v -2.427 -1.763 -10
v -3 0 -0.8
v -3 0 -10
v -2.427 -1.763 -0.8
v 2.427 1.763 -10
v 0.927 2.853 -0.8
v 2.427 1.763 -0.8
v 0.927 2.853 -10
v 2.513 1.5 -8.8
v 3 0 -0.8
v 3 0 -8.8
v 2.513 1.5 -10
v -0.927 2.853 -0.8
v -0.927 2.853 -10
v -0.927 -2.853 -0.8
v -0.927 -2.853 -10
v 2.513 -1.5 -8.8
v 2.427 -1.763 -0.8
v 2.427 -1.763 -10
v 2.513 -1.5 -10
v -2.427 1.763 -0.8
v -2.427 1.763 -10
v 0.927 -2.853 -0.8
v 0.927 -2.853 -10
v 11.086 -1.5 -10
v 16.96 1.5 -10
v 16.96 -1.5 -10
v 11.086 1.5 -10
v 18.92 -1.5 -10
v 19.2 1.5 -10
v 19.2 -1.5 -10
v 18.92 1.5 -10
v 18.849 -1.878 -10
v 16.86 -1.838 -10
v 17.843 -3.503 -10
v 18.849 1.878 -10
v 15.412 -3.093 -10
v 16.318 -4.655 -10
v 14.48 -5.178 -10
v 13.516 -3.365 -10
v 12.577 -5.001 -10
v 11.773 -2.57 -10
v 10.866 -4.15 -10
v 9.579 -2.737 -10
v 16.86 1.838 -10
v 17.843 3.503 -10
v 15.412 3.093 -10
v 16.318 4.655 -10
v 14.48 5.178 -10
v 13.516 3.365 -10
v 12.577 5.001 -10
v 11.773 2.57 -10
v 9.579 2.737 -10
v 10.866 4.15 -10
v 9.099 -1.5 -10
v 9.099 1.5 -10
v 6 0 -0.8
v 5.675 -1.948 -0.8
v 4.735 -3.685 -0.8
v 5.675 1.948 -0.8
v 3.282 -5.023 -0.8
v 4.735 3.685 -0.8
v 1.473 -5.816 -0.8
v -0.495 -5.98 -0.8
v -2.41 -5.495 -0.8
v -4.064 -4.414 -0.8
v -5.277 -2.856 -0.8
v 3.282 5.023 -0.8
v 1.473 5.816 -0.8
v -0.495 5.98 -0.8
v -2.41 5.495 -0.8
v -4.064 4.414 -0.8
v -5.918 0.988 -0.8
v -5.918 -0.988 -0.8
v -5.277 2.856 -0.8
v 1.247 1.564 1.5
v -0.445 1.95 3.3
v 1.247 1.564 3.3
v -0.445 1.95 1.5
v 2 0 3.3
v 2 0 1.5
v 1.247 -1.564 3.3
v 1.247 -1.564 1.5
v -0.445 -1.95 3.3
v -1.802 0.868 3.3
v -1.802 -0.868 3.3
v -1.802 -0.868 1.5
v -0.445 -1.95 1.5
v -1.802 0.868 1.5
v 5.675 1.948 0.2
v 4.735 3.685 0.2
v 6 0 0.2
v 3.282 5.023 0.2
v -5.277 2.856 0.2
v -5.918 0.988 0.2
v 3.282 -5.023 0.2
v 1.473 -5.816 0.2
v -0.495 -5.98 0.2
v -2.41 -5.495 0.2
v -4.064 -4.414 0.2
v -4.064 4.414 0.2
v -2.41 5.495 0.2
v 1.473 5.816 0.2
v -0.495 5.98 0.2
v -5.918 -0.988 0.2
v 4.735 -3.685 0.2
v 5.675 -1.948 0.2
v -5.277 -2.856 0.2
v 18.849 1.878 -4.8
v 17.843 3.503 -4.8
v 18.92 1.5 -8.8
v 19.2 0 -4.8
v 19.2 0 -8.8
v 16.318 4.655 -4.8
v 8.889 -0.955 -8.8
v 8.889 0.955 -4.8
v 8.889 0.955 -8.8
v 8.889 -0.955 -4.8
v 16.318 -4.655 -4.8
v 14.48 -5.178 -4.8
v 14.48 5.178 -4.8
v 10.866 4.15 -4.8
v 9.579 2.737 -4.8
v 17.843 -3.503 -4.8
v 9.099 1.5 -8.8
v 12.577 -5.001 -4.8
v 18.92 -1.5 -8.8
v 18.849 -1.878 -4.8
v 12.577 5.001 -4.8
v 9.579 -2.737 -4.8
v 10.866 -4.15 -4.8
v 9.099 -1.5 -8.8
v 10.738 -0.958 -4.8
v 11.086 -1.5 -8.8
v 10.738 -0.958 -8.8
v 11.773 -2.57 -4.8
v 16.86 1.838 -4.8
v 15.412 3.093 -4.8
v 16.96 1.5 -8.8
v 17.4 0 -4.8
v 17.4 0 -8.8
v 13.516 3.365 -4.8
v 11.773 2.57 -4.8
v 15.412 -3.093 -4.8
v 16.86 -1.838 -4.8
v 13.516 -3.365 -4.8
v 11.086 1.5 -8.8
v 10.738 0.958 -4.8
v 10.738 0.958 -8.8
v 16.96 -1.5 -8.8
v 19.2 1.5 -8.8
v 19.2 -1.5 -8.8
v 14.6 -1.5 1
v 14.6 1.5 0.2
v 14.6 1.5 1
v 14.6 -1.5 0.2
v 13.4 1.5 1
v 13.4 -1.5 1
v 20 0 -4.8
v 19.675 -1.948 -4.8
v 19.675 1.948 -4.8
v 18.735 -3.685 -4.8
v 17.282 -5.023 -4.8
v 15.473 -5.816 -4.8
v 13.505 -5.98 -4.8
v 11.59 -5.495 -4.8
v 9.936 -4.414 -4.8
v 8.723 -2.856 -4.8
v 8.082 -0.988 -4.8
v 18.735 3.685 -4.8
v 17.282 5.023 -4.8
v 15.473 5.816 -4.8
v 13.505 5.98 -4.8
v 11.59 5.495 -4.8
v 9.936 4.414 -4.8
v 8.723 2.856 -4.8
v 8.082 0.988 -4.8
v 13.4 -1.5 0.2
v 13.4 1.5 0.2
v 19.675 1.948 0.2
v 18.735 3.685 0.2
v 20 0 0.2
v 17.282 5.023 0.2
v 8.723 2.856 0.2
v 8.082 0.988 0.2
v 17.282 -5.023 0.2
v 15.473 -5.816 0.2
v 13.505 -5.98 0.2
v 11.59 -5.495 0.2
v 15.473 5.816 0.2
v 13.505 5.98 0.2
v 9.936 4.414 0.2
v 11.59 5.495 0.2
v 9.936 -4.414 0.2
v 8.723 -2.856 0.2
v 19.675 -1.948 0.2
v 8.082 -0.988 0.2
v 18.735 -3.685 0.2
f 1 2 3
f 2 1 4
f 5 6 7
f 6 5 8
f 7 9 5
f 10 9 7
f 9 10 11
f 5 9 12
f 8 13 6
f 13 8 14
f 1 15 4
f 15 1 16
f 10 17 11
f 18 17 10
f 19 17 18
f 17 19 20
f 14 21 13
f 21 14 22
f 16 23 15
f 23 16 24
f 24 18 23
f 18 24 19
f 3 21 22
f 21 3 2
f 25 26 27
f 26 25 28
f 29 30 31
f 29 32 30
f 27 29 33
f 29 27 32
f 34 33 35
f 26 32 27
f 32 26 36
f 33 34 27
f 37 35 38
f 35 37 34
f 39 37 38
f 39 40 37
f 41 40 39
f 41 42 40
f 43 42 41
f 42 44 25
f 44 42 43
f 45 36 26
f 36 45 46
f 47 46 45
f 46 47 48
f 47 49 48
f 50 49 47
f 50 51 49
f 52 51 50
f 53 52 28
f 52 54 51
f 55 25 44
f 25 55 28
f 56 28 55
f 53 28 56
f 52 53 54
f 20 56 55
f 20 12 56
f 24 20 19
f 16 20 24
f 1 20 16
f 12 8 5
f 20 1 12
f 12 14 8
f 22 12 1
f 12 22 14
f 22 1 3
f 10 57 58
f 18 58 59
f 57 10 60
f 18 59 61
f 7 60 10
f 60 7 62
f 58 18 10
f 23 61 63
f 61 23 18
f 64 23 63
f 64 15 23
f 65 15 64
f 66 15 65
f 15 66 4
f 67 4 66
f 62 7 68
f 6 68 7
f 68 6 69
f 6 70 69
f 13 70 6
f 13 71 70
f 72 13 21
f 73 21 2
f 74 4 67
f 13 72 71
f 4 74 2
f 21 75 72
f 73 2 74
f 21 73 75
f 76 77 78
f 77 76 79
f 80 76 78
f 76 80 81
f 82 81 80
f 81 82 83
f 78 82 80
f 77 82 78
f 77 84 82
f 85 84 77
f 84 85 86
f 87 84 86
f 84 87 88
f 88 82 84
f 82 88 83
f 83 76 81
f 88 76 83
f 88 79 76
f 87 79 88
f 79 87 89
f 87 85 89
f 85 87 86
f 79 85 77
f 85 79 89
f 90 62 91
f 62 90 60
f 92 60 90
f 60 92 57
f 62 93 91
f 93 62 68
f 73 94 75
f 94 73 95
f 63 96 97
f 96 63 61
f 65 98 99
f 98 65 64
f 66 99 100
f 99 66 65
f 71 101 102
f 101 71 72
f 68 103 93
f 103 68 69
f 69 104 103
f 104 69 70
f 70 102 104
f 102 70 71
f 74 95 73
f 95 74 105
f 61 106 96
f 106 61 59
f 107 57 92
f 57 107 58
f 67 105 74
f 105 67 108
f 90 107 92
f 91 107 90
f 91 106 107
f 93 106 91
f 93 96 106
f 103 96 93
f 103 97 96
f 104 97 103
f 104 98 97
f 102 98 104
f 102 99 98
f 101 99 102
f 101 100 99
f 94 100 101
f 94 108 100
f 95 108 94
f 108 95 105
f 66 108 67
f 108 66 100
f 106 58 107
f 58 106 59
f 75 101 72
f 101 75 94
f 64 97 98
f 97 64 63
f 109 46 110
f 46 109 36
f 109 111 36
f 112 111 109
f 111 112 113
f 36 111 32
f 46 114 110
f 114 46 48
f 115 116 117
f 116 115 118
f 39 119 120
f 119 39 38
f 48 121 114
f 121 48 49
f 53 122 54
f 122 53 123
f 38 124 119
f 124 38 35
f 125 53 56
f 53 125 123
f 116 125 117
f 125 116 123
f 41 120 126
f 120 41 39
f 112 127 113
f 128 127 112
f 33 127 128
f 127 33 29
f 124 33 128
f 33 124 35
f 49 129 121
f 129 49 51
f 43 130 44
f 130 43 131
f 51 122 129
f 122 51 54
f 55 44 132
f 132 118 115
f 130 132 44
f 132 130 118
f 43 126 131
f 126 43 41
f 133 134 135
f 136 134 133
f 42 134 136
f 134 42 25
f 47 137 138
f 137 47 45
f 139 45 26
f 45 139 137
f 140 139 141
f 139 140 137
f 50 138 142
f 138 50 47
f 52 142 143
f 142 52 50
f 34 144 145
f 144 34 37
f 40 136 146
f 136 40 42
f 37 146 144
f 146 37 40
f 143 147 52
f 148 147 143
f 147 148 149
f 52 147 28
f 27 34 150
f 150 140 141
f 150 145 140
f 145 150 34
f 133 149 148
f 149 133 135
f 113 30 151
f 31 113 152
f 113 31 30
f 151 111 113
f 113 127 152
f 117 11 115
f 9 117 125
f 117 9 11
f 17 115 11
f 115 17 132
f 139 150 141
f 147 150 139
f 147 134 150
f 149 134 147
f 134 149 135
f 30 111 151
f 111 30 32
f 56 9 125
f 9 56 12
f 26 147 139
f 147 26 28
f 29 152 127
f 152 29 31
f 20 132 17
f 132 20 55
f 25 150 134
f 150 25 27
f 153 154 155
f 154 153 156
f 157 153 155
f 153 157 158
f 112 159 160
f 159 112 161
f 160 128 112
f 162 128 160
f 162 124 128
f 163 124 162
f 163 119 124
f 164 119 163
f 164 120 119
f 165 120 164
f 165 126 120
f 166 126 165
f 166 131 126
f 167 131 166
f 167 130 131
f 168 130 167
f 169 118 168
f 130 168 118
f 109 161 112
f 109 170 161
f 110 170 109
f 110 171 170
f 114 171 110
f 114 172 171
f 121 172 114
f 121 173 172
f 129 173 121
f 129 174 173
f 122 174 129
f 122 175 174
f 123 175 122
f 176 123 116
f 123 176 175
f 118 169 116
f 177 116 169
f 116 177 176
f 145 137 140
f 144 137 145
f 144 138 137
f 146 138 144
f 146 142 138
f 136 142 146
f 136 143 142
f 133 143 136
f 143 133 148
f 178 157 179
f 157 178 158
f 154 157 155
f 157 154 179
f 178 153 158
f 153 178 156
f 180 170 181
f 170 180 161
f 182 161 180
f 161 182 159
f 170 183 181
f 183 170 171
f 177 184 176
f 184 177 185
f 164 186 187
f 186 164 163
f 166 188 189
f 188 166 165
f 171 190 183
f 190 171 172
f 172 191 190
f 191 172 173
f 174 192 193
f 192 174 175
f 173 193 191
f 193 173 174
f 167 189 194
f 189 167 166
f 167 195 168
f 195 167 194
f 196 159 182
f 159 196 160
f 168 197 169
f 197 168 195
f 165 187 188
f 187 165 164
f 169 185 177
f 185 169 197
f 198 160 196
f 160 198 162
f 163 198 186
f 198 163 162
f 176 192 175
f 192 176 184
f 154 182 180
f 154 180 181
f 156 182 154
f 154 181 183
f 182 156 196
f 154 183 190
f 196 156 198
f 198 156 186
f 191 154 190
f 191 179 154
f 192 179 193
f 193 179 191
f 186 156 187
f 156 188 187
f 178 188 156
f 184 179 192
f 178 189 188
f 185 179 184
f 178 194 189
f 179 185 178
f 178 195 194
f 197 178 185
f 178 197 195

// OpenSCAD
// Parameters
thread_major_diameter = 6.0; //[3.0:12.0:0.1]
overall_length = 10.0; //[5.0:20.0:0.1]
head_diameter = 10.5; //[6.0:21.0:0.1]
head_height = 3.3; //[1.6:6.6:0.1]
thread_length = 10.0; //[5.0:20.0:0.1]
drive_recess_diameter = 4.0; //[2.0:7.0:0.1]
drive_recess_depth = 1.8; //[0.8:3.0:0.1]
transition_height = 0.8; //[0.4:1.6:0.1]
transition_overlap = 0.8; //[0.5:2.0:0.1]
washer_outer_diameter = 12.0; //[8.0:24.0:0.1]
washer_thickness = 1.0; //[0.5:2.5:0.1]
pcb_spacer_height = 6.0; //[3.0:12.0:0.1]
pcb_spacer_wall = 1.8; //[0.9:3.6:0.1]
pcb_spacer_clearance = 0.4; //[0.2:0.8:0.1]
buzzer_diameter = 12.0; //[8.0:24.0:0.1]
buzzer_height = 5.0; //[3.0:10.0:0.1]
bridge_thickness = 1.2; //[0.6:2.4:0.1]
bridge_width = 3.0; //[1.5:6.0:0.1]
side_offset = 14.0; //[8.0:28.0:0.1]

// Screw and Washer - complete geometry
module screw_and_washer() {
  color("DimGray") {
    // Threaded Shaft
    translate([0, 0, -overall_length/2])
      cylinder(h=overall_length, r=thread_major_diameter/2, center=true);

    // Head Transition
    translate([0, 0, transition_height/2 - transition_overlap])
      cylinder(h=transition_height, r1=head_diameter/2, r2=thread_major_diameter/2, center=true);

    // Dome Head
    intersection() {
      translate([0, 0, head_height - ((head_diameter/2)^2 + head_height^2)/(2*head_height)])
        sphere(r=((head_diameter/2)^2 + head_height^2)/(2*head_height));
      translate([0, 0, head_height + ((head_diameter/2)^2 + head_height^2)/(2*head_height)])
        cube([head_diameter*3, head_diameter*3, ((head_diameter/2)^2 + head_height^2)/(2*head_height)*2], center=true);
    }

    // Drive Recess
    translate([0, 0, head_height - drive_recess_depth/2])
      difference() {
        cylinder(h=drive_recess_depth, r=drive_recess_diameter/2, center=true);
      }

    // Washer
    translate([0, 0, washer_thickness/2 - transition_overlap])
      cylinder(h=washer_thickness, r=washer_outer_diameter/2, center=true);
  }
}

// PCB Spacer - complete geometry
module pcb_spacer() {
  color("Silver") {
    difference() {
      translate([side_offset, 0, -overall_length + pcb_spacer_height/2])
        cylinder(h=pcb_spacer_height, r=(thread_major_diameter/2 + pcb_spacer_clearance) + pcb_spacer_wall, center=true);
      translate([side_offset, 0, -overall_length + pcb_spacer_height/2])
        cylinder(h=pcb_spacer_height + transition_overlap*2, r=thread_major_diameter/2 + pcb_spacer_clearance, center=true);
    }
  }
}

// Buzzer - complete geometry
module buzzer() {
  color("Black") {
    translate([side_offset, 0, -overall_length + pcb_spacer_height + buzzer_height/2 - transition_overlap])
      cylinder(h=buzzer_height, r=buzzer_diameter/2, center=true);
  }
}

// Bridges
module bridges() {
  color("Silver") {
    // Bridge to Spacer
    translate([(side_offset + (thread_major_diameter/2 + pcb_spacer_clearance) + pcb_spacer_wall)/2, 0, -overall_length + bridge_thickness/2])
      cube([side_offset + (thread_major_diameter/2 + pcb_spacer_clearance) + pcb_spacer_wall, bridge_width, bridge_thickness], center=true);

    // Bridge Spacer to Buzzer
    translate([side_offset, 0, -overall_length + pcb_spacer_height + (buzzer_height - transition_overlap)/2])
      cube([bridge_thickness, bridge_width, buzzer_height + transition_overlap], center=true);
  }
}

// Assembly
module assembly() {
  screw_and_washer();
  pcb_spacer();
  buzzer();
  bridges();
}

assembly();
